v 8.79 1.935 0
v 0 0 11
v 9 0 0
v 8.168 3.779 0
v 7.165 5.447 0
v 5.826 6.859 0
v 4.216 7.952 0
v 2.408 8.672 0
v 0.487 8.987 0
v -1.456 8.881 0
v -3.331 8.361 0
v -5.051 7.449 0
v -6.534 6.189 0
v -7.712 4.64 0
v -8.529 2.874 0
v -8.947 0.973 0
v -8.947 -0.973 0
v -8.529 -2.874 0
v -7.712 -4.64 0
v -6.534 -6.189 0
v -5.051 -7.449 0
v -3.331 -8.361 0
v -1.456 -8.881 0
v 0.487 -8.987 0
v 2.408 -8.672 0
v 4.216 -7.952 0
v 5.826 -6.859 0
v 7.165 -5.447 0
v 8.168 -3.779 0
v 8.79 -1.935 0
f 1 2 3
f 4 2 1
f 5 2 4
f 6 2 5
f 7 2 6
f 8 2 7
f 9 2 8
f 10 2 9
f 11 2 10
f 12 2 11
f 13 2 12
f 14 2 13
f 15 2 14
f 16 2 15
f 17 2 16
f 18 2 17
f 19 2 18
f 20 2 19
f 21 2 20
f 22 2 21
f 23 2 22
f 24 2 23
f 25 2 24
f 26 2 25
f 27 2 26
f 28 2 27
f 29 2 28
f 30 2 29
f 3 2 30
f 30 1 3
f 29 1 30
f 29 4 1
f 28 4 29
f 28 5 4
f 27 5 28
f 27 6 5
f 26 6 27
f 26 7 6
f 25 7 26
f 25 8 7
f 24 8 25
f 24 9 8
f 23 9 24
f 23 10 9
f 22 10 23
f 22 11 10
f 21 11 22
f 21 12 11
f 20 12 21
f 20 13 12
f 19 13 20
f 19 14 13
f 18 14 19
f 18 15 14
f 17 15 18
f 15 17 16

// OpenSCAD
// Generated by SolidPython 1.0.1 on 2020-07-29 00:46:43


cylinder(h = 11, r1 = 9, r2 = 0);
/***********************************************
*********      SolidPython code:      **********
************************************************
 
# import packages: SolidPython
from solid import *
from solid.utils import *
from itertools import chain, combinations, permutations


class Resize:

    def __init__(self, scad_file):
        self.scad_file = scad_file
        #self.scad_file = import_scad(scad_file)
        # cone/cylinder param:
        self.r1 = 0
        self.r2 = 0
        self.h = 0
        # rectangular prism param:
        self.w = 0
        self.l = 0
        # ellipse param:
        self.r = 0

    # import OpenScad code (file name corresponds to shape)


    # classify shape + parameters
    def assign(self, param1, param2, param3):
        if self.scad_file == 'cone.scad':
            self.r1 = param1
            self.r2 = param2
            self.h = param3
        elif self.scad_file == 'cylinder.scad':
            self.r1 = param1
            self.r2 = param2
            self.h = param3
        elif self.scad_file == 'rectangularPrism.scad':
            self.h = param1
            self.l = param2
            self.w = param3
        else:
            self.r = param1
            self.h = param2

    # resize parameters
    def iterate(self):
        x = range(3, 20, 2)
        i = 1
        if self.scad_file == 'cone.scad':
            tempList = list(permutations(x, 2))
            for temp in tempList:
                param1 = temp[0]
                param2 = temp[1]
                filepath = 'produced_scad_files/' + 'cone' + str(param1) + '_' + str(param2) + '_' + '.scad'
                scad_render_to_file(cylinder(h=param1, r1=param2, r2=0), filepath)

        elif self.scad_file == 'cylinder.scad':
            tempList = list(permutations(x, 3))
            for temp in tempList:
                param1 = temp[0]
                param2 = temp[1]
                filepath = 'produced_scad_files/' + 'cylinder' + str(param1) + '_' + str(param2) + '_' + '.scad'
                scad_render_to_file(cylinder(h=param1, r1=param2, r2=param2), filepath)

        elif self.scad_file == 'rectangularPrism.scad':
            tempList = list(permutations(x, 3))
            for temp in tempList:
                param1 = temp[0]
                param2 = temp[1]
                param3 = temp[2]
                filepath = 'produced_scad_files/' + 'rectangularPrism' + str(param1) + '_' + str(param2) + '_' + str(
                    param3) + '.scad'
                scad_render_to_file(cube(size=(param1, param2, param3)), filepath)

        elif self.scad_file == 'ellipse.scad':
            tempList = list(permutations(x, 4))
            for temp in tempList:
                param1 = temp[0]
                param2 = temp[1]
                param3 = temp[2]
                param4 = temp[3]
                filepath = 'produced_scad_files/' + 'ellipse' + str(param1) + '_' + str(param2) + '_' + str(param3) + '_' + str(param4) + '.scad'
                scad_render_to_file(scale([param1, param2, param3])(sphere(r=param4)), filepath)

    def render_to_scadfile(self):
        scad_render_to_file(scad, 'example.scad') 
 
************************************************/
